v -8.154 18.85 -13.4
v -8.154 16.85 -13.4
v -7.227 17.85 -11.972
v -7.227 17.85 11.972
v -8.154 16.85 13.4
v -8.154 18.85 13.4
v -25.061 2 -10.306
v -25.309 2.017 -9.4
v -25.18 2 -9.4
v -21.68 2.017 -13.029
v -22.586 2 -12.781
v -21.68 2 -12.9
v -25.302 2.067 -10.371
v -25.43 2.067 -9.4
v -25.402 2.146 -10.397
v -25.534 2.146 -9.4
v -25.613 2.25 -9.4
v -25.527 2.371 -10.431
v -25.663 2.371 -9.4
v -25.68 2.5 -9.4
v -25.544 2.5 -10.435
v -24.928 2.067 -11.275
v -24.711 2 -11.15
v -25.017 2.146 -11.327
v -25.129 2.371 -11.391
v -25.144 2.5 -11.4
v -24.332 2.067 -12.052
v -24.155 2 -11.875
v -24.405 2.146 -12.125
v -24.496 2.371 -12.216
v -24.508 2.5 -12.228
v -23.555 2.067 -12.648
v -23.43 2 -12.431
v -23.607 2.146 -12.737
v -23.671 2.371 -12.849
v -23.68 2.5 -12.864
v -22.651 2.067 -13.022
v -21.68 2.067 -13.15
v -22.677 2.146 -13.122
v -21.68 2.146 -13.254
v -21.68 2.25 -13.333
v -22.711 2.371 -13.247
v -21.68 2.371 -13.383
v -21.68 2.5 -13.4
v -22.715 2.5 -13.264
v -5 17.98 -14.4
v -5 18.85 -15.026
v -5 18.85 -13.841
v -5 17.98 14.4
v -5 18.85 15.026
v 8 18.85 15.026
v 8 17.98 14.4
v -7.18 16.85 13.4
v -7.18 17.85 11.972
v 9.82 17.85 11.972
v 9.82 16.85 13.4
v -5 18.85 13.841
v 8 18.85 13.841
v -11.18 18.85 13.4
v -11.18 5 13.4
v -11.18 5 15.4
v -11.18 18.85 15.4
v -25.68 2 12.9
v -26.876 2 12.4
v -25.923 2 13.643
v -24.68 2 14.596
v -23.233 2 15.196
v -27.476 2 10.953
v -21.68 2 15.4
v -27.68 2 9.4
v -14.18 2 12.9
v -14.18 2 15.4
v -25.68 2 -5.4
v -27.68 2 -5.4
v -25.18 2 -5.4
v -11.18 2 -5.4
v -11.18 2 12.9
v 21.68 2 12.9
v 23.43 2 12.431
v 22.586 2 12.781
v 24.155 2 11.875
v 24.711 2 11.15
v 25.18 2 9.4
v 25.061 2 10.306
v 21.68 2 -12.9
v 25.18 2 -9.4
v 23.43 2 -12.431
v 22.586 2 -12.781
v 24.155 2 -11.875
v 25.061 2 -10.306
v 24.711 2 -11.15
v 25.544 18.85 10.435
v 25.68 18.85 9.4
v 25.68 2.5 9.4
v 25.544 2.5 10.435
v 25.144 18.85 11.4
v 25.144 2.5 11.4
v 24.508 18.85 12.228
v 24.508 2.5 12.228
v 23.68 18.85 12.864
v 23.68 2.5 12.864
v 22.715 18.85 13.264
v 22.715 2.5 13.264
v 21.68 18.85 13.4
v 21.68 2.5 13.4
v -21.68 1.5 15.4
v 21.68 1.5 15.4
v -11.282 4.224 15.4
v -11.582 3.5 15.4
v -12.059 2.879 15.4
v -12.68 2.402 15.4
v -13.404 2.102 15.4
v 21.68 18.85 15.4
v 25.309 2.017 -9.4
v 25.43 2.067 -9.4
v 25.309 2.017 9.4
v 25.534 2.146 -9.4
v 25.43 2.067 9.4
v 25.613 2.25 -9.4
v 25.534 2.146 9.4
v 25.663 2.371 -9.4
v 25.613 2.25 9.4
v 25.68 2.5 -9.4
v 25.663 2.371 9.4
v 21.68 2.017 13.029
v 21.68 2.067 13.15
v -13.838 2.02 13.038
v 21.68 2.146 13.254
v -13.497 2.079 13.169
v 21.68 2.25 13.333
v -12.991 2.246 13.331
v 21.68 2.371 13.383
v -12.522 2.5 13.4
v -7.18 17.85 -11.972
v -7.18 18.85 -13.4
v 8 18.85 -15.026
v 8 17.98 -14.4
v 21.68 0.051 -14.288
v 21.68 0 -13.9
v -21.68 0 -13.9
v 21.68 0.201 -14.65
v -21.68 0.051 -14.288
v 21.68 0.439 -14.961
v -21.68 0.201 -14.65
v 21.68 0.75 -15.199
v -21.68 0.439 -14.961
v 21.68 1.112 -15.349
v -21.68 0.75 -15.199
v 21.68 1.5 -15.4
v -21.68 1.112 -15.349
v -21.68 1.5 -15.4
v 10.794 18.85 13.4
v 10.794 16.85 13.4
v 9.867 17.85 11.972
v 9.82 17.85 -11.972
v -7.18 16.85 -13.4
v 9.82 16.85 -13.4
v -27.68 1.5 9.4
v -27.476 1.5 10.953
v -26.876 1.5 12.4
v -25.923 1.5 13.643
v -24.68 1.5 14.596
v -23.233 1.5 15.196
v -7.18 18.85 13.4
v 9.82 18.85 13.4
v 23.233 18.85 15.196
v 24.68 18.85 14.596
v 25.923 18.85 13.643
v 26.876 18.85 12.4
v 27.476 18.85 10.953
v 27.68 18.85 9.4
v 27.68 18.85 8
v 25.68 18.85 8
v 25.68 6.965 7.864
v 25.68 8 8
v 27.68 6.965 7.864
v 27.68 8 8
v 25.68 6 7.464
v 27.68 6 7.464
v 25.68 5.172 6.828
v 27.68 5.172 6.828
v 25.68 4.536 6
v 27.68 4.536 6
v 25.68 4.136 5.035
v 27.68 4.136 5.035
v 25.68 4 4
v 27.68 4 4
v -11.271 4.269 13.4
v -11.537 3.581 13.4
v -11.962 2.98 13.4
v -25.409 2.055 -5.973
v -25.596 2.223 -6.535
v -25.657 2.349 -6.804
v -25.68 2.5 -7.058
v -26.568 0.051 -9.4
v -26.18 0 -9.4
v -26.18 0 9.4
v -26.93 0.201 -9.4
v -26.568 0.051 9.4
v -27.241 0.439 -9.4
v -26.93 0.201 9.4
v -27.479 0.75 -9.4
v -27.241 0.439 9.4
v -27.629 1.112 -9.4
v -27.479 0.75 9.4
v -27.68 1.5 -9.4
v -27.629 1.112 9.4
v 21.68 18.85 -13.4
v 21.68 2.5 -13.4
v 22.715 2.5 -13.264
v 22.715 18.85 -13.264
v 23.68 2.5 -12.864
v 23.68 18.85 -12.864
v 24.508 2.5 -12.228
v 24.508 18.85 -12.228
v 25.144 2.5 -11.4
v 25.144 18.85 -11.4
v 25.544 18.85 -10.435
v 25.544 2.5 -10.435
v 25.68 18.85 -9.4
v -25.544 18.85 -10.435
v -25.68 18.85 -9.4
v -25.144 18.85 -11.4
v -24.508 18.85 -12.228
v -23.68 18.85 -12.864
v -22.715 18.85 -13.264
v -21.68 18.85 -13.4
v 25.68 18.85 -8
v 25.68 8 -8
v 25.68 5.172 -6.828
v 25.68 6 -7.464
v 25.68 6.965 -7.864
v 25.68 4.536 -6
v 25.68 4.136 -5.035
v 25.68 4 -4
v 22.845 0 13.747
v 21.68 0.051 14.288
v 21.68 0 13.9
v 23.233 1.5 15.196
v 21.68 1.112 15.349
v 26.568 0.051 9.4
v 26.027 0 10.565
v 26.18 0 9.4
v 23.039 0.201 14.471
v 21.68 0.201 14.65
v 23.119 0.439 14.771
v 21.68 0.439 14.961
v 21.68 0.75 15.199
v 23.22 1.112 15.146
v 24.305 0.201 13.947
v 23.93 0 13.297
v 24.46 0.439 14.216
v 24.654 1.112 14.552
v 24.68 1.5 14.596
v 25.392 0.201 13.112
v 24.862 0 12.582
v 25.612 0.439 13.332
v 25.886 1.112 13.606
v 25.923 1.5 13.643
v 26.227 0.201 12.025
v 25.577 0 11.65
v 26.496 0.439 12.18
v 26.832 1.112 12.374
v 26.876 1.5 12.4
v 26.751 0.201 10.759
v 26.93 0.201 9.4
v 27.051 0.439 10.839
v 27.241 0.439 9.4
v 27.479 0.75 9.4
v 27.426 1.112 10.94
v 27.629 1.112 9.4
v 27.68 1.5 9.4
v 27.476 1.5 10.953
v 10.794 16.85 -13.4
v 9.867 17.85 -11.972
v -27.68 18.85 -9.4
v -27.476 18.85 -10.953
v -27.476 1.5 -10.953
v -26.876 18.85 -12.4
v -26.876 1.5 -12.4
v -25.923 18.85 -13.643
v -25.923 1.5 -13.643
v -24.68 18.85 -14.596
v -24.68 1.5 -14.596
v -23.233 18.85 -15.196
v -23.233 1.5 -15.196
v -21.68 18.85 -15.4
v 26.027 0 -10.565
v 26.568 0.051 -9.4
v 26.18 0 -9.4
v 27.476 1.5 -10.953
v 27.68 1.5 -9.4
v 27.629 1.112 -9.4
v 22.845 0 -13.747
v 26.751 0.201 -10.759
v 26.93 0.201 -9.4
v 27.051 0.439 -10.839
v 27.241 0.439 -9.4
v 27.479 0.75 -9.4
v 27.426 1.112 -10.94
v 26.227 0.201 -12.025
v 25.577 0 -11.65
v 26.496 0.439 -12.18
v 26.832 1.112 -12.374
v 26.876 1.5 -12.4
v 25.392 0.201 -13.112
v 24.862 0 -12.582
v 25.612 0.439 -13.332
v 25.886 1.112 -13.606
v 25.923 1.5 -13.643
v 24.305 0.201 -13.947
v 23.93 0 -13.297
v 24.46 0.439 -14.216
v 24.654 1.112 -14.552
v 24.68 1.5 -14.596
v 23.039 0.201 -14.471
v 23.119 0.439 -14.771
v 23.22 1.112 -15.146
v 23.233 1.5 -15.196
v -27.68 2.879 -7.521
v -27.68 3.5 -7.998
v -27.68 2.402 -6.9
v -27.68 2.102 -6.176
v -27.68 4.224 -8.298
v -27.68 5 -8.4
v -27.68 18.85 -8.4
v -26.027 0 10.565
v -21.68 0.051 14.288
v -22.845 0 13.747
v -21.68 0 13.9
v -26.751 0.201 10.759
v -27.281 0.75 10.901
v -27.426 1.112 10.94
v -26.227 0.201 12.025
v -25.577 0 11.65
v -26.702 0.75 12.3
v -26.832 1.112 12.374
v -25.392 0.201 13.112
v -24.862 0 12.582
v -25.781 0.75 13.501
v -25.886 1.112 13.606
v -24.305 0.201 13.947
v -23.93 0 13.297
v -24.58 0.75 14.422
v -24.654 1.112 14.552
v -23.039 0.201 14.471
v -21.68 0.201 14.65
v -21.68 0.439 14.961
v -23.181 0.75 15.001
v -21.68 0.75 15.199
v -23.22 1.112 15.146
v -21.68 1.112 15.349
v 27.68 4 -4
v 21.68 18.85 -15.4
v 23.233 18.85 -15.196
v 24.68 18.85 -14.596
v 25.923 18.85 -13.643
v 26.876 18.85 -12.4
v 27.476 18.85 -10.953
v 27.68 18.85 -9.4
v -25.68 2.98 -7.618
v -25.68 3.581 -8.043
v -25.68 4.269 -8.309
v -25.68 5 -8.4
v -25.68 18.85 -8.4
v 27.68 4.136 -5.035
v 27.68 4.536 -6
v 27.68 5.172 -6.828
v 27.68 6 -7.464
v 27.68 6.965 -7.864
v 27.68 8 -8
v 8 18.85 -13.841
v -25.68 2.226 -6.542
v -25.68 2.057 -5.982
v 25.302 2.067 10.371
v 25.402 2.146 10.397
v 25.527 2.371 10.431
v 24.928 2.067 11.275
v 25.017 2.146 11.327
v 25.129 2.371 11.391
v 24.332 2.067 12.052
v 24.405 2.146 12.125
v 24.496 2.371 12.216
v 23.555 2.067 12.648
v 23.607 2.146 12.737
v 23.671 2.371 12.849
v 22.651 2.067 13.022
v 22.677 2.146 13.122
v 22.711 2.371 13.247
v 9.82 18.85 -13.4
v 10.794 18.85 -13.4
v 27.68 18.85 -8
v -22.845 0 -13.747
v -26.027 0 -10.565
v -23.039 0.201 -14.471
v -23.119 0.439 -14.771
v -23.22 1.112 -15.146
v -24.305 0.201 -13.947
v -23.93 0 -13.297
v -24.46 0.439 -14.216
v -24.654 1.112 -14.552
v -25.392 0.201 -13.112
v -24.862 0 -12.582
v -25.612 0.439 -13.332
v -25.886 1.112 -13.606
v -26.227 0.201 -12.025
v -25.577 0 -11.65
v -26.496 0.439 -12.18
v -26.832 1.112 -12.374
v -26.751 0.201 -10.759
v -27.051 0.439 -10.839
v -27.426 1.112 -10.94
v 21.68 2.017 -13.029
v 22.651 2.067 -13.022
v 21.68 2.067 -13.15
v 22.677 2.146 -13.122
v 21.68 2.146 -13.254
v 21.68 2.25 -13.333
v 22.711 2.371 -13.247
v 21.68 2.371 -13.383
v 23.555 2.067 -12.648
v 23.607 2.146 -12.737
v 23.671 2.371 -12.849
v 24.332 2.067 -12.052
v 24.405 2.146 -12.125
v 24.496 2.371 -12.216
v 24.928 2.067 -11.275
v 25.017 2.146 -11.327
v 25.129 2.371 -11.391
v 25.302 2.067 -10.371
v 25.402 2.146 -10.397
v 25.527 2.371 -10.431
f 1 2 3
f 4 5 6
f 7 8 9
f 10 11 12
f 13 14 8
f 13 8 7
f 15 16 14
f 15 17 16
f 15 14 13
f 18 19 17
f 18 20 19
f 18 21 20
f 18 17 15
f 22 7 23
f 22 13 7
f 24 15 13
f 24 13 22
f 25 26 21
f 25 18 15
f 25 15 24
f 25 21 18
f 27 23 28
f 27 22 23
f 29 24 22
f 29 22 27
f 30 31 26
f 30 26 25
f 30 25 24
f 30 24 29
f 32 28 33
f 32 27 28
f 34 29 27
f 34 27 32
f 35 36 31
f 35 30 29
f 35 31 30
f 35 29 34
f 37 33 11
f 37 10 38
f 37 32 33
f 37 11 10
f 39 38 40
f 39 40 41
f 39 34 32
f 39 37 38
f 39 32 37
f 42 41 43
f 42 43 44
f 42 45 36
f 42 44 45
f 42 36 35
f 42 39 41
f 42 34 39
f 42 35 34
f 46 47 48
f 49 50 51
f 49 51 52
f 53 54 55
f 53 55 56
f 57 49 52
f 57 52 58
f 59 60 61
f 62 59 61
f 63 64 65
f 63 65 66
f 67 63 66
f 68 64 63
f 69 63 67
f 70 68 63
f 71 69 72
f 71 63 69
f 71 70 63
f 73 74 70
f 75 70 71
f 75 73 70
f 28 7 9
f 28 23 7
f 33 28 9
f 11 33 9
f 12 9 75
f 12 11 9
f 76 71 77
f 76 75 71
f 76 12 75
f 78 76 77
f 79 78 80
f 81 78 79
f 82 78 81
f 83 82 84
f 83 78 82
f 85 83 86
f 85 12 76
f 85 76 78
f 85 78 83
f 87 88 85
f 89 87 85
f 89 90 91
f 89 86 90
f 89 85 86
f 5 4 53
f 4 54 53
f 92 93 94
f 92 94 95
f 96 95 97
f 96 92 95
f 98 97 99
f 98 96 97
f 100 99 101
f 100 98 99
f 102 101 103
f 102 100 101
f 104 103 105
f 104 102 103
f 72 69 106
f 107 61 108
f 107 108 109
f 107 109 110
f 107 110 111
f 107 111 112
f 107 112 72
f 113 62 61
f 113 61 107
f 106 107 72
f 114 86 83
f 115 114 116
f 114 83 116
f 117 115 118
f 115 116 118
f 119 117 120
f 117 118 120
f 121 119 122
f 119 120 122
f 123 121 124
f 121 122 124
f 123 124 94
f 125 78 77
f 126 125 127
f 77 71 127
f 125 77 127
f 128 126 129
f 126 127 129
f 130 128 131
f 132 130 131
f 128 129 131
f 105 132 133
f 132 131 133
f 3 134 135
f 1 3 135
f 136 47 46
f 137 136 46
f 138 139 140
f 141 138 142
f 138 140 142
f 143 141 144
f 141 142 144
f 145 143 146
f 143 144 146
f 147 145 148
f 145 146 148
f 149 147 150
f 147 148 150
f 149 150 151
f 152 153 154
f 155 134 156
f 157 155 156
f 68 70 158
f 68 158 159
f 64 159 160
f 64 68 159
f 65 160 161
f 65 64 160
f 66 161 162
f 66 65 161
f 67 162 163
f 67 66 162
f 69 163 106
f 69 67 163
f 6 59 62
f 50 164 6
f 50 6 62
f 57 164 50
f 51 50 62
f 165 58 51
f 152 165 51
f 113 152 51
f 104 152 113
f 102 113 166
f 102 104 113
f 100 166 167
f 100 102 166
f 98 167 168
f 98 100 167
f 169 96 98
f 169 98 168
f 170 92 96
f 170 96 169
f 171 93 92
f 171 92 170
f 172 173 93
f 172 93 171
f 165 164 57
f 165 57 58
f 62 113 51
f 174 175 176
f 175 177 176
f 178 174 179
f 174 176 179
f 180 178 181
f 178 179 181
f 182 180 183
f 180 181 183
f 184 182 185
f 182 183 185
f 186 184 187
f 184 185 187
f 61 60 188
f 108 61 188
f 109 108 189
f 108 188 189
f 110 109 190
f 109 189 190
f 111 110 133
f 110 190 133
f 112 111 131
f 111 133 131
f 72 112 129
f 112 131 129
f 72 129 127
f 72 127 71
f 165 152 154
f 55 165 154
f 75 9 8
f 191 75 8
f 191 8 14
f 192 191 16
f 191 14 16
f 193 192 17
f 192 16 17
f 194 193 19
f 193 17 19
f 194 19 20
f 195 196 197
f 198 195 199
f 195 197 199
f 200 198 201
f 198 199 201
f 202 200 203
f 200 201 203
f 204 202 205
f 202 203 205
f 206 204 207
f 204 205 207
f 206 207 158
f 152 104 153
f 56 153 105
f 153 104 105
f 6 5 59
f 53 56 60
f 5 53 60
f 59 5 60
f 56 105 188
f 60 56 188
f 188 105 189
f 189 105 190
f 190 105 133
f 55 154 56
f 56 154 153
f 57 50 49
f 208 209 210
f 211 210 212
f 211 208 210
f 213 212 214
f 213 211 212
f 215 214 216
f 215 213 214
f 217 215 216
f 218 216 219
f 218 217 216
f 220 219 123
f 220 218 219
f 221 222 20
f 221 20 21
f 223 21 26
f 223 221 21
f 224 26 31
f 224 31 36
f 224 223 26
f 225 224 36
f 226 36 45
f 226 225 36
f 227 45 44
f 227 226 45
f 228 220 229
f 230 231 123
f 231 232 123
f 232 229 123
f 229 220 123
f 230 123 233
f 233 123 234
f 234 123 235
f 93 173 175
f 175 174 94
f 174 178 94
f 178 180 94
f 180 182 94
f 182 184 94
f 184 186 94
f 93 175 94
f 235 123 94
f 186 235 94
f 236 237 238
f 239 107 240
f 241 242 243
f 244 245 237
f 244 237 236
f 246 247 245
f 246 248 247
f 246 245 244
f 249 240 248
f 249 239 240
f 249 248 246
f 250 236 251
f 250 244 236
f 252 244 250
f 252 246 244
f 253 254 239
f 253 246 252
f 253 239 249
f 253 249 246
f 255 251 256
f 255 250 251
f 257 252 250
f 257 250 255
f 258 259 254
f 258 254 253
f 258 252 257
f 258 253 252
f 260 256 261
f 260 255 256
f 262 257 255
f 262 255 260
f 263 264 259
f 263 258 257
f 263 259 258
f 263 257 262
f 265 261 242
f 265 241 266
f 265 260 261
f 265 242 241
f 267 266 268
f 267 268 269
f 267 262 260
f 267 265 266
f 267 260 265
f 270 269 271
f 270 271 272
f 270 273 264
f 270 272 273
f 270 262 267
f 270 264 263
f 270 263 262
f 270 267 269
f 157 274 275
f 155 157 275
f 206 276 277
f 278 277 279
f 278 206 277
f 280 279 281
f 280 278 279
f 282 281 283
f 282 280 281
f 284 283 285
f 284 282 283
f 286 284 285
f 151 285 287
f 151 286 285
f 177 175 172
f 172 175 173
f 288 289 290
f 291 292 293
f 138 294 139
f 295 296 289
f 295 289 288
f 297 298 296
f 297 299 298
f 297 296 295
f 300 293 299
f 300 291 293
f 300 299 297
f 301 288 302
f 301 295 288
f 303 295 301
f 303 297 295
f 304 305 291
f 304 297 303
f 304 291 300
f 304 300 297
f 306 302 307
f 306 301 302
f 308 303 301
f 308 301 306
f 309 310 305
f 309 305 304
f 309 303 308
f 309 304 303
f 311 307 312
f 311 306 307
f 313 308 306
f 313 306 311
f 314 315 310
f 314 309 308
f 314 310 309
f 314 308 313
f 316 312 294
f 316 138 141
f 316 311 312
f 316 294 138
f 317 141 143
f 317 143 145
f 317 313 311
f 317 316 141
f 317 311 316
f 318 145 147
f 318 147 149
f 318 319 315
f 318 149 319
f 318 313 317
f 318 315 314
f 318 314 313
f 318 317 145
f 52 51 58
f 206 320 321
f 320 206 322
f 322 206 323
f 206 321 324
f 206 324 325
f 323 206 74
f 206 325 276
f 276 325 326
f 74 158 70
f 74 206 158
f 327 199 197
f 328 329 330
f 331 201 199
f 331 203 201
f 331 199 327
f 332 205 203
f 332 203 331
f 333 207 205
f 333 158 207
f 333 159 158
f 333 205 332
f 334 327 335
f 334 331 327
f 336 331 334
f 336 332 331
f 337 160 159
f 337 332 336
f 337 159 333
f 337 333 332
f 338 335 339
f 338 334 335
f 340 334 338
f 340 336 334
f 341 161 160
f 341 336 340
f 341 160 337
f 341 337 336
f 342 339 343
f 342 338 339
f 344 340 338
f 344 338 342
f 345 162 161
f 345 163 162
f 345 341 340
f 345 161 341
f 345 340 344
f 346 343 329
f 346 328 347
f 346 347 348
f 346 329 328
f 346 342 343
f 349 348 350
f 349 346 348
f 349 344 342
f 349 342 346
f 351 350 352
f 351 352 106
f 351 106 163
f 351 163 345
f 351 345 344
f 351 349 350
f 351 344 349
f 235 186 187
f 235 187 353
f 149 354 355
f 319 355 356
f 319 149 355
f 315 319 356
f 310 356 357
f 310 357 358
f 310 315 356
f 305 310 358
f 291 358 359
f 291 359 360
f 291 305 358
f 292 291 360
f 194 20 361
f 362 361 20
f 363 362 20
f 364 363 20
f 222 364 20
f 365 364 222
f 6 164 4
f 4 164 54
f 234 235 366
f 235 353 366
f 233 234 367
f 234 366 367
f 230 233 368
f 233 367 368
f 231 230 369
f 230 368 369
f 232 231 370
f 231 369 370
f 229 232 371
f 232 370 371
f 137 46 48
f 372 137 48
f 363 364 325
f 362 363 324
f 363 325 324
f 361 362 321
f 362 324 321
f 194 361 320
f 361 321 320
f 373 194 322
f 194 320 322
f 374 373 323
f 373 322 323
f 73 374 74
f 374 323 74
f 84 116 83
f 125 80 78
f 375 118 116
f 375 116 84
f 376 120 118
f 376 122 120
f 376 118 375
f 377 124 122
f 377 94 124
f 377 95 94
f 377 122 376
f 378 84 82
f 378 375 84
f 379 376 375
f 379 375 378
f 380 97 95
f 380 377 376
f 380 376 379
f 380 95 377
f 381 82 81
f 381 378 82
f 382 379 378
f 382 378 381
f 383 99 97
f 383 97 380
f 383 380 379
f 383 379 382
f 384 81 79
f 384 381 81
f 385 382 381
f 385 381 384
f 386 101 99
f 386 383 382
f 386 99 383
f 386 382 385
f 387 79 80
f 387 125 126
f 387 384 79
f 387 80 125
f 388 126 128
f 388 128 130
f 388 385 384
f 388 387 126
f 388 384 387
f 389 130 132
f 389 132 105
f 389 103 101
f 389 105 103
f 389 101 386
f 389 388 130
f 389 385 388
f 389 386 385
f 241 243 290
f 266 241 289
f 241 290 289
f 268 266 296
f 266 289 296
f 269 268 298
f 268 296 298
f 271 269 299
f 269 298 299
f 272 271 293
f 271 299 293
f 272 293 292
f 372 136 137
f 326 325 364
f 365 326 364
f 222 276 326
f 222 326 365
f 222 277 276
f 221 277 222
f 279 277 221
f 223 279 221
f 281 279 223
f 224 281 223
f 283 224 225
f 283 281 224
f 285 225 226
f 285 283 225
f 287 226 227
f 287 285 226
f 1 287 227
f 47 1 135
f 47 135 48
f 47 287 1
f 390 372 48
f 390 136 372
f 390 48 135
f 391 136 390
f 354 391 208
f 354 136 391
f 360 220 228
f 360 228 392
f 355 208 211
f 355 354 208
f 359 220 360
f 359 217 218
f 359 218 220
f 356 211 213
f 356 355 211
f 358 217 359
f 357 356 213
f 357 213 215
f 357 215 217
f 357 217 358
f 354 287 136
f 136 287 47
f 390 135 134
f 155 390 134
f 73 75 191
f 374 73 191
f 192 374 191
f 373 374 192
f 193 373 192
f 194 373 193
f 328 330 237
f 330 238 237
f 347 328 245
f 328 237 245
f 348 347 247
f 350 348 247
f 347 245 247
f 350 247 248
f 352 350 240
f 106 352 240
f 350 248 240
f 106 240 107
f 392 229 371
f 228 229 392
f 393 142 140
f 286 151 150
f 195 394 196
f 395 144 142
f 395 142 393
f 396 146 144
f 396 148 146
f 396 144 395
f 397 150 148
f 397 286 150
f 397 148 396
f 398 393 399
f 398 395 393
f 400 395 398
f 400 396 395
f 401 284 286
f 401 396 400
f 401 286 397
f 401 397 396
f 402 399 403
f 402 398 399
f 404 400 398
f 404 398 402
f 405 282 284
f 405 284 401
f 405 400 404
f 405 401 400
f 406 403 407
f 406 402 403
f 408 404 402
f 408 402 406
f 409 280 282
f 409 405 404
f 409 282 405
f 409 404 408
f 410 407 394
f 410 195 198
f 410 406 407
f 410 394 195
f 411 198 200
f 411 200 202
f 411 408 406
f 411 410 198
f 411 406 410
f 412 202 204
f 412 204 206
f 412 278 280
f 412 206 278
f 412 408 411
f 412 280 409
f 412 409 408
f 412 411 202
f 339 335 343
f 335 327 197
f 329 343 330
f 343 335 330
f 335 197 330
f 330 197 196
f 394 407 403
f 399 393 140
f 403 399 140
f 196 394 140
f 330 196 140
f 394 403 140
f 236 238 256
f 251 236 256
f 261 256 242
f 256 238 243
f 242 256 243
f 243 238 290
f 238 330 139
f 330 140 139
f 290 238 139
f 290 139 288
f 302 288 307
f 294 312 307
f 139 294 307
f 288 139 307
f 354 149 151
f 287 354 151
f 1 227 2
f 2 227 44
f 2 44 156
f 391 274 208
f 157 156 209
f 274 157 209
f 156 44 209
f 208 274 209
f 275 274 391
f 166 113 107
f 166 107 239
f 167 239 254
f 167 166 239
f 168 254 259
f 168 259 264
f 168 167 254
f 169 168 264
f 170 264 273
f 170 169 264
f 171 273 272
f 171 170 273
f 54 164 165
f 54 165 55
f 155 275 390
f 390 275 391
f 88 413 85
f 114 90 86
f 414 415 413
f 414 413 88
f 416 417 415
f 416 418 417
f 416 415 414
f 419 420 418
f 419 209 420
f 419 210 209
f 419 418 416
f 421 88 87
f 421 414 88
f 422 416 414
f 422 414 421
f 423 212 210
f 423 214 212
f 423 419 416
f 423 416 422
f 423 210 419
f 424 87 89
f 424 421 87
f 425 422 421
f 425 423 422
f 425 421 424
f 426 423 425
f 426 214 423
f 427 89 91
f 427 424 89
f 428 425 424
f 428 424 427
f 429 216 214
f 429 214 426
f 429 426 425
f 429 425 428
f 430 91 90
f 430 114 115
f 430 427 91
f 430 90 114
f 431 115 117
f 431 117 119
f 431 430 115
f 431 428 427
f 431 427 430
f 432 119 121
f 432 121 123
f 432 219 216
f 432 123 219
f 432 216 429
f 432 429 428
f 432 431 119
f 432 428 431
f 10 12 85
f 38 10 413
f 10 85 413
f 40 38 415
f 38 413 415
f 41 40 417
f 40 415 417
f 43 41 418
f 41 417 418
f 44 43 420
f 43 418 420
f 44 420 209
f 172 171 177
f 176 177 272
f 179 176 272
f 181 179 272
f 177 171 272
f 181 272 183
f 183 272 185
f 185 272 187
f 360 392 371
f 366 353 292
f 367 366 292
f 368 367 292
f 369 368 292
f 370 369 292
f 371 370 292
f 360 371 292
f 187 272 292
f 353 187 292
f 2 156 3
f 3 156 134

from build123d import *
from OCP.BRepFilletAPI import BRepFilletAPI_MakeFillet

# Parameters (mm, degrees)
SKETCH1_W               = 55.36
SKETCH1_H               = 30.8
BOSS_EXTRUDE1_DEPTH     = 2
SKETCH3_W               = 2
SKETCH3_H               = 5
BOSS_EXTRUDE3_DEPTH     = 16.85
SKETCH5_W               = 16
SKETCH5_H               = 20
CUT_EXTRUDE1_DEPTH      = 37.860071894
FILLET1_R1              = 6
FILLET1_R2              = 4
FILLET2_R               = 1.5
BOSS_EXTRUDE4_START     = -3
BOSS_EXTRUDE4_DEPTH     = 17
CHAMFER1_SIZE           = 0.97411139
CHAMFER1_SIZE_2         = 1.5
FILLET6_R               = 0.5
FILLET7_R               = 4
CUT_EXTRUDE2_DEPTH      = 8
CUT_EXTRUDE2_DEPTH_BACK = 5
FILLET8_START           = -27.68
FILLET8_DEPTH           = 2
FILLET8_START_2         = 12.8999999
FILLET8_2_DEPTH         = 2.5000001
FILLET8_START_3         = -8.4
FILLET8_3_DEPTH         = 3.0000001
FILLET8_START_4         = -25.68
FILLET8_4_DEPTH         = 14.5


with BuildPart() as part:
    # Sketch1 → Boss-Extrude1 (new body)
    with BuildSketch(Plane(origin=(0, 0, 0), x_dir=(1, 0, 0), z_dir=(0, 1, 0))):
        Rectangle(SKETCH1_W, SKETCH1_H)
    extrude(amount=BOSS_EXTRUDE1_DEPTH)

    # Sketch3 → Boss-Extrude3 (add)
    with BuildSketch(Plane(origin=(0, 2, 0), x_dir=(1, 0, 0), z_dir=(0, 1, 0))):
        with Locations((-26.68, 10.9)):
            Rectangle(SKETCH3_W, SKETCH3_H)
        Polygon((-27.68, 15.4), (-27.68, 13.4), (-25.68, 13.4), (25.68, 13.4), (25.68, -13.4), (-11.18, -13.4), (-11.18, -15.4), (27.68, -15.4), (27.68, 15.4), align=None)
    extrude(amount=BOSS_EXTRUDE3_DEPTH)

    # Sketch5 → Cut-Extrude1 (cut, through all)
    with BuildSketch(Plane(origin=(0, 0, 0), x_dir=(0, 0, -1), z_dir=(1, 0, 0))):
        with Locations((0, 14)):
            Rectangle(SKETCH5_W, SKETCH5_H)
    extrude(amount=CUT_EXTRUDE1_DEPTH, mode=Mode.SUBTRACT)

    # Fillet1: one fillet with a radius per group of edges: ONE call of the kernel's fillet builder (fillet() takes one radius for all edges)
    fillet1_edges_1 = [part.edges().sort_by_distance(p)[0] for p in [
        (27.68, 9.425, -15.4),
        (27.68, 9.425, 15.4),
        (-27.68, 9.425, -15.4),
        (-27.68, 1, 15.4),
    ]]
    fillet1_edges_2 = [part.edges().sort_by_distance(p)[0] for p in [
        (25.68, 10.425, -13.4),
        (25.68, 10.425, 13.4),
        (-25.68, 10.425, -13.4),
    ]]
    fillet1 = BRepFilletAPI_MakeFillet(part.part.solid().wrapped)
    for e in fillet1_edges_1:
        fillet1.Add(FILLET1_R1, e.wrapped)
    for e in fillet1_edges_2:
        fillet1.Add(FILLET1_R2, e.wrapped)
    add(Compound.cast(fillet1.Shape()), mode=Mode.REPLACE)

    # Fillet2
    fillet2_edges = [part.edges().sort_by_distance(p)[0] for p in [
        (0, 0, 15.4),
        (27.68, 0, 0),
        (-27.68, 0, 0),
        (0, 0, -15.4),
        (25.922640687, 0, -13.642640687),
        (25.922640687, 0, 13.642640687),
        (-25.922640687, 0, -13.642640687),
        (-25.922640687, 0, 13.642640687),
    ]]
    fillet(fillet2_edges, radius=FILLET2_R)

    # Sketch4 → Boss-Extrude4 (add)
    with BuildSketch(Plane.ZY.offset(10.18).offset(BOSS_EXTRUDE4_START)):
        Polygon((-13.4, 18.85), (-11.971851993, 17.85), (-13.4, 16.85), align=None)
        Polygon((13.4, 18.85), (11.971851993, 17.85), (13.4, 16.85), align=None)
    extrude(amount=-BOSS_EXTRUDE4_DEPTH)

    # Chamfer1
    # the kernel refuses this chamfer: 1.5, 0.97411139 mm, written as the material it adds along each edge
    with BuildSketch(Plane(origin=(9.82, 12.9733385, 13.4), x_dir=(1, 0, 0), z_dir=(0, 1, 0))) as chamfer1_piece_1_section:
        Polygon((CHAMFER1_SIZE, 0), (0, CHAMFER1_SIZE_2), (0, 0), align=None)
    chamfer1_piece_1 = extrude(amount=5.8766615, mode=Mode.PRIVATE)
    chamfer1_piece_1 = split(chamfer1_piece_1, bisect_by=Plane(origin=(9.82, 15.574617411, 15.221435103), z_dir=(0, 0.8191520442889897, 0.5735764363510492)), keep=Keep.TOP, mode=Mode.PRIVATE)
    chamfer1_piece_1 = split(chamfer1_piece_1, bisect_by=Plane(origin=(9.82, 16.916637554, 10.638872277), z_dir=(0, -0.8191520442889973, 0.5735764363510382)), keep=Keep.TOP, mode=Mode.PRIVATE)
    add(chamfer1_piece_1)
    with BuildSketch(Plane(origin=(-7.18, 12.9733385, 13.4), x_dir=(-1, 0, 0), z_dir=(0, 1, 0))) as chamfer1_piece_2_section:
        Polygon((CHAMFER1_SIZE, 0), (0, -CHAMFER1_SIZE_2), (0, 0), align=None)
    chamfer1_piece_2 = extrude(amount=5.8766615, mode=Mode.PRIVATE)
    chamfer1_piece_2 = split(chamfer1_piece_2, bisect_by=Plane(origin=(-7.18, 15.574617411, 15.221435103), z_dir=(0, 0.8191520442889897, 0.5735764363510492)), keep=Keep.TOP, mode=Mode.PRIVATE)
    chamfer1_piece_2 = split(chamfer1_piece_2, bisect_by=Plane(origin=(-7.18, 16.916637554, 10.638872277), z_dir=(0, -0.8191520442889973, 0.5735764363510382)), keep=Keep.TOP, mode=Mode.PRIVATE)
    add(chamfer1_piece_2)
    with BuildSketch(Plane(origin=(9.82, 12.9733385, -13.4), x_dir=(1, 0, 0), z_dir=(0, 1, 0))) as chamfer1_piece_3_section:
        Polygon((CHAMFER1_SIZE, 0), (0, -CHAMFER1_SIZE_2), (0, 0), align=None)
    chamfer1_piece_3 = extrude(amount=5.8766615, mode=Mode.PRIVATE)
    chamfer1_piece_3 = split(chamfer1_piece_3, bisect_by=Plane(origin=(9.82, 15.574617411, -15.221435103), z_dir=(0, 0.8191520442889897, -0.5735764363510492)), keep=Keep.TOP, mode=Mode.PRIVATE)
    chamfer1_piece_3 = split(chamfer1_piece_3, bisect_by=Plane(origin=(9.82, 16.916637554, -10.638872277), z_dir=(0, -0.8191520442889973, -0.5735764363510382)), keep=Keep.TOP, mode=Mode.PRIVATE)
    add(chamfer1_piece_3)
    with BuildSketch(Plane(origin=(-7.18, 12.9733385, -13.4), x_dir=(-1, 0, 0), z_dir=(0, 1, 0))) as chamfer1_piece_4_section:
        Polygon((CHAMFER1_SIZE, 0), (0, CHAMFER1_SIZE_2), (0, 0), align=None)
    chamfer1_piece_4 = extrude(amount=5.8766615, mode=Mode.PRIVATE)
    chamfer1_piece_4 = split(chamfer1_piece_4, bisect_by=Plane(origin=(-7.18, 15.574617411, -15.221435103), z_dir=(0, 0.8191520442889897, -0.5735764363510492)), keep=Keep.TOP, mode=Mode.PRIVATE)
    chamfer1_piece_4 = split(chamfer1_piece_4, bisect_by=Plane(origin=(-7.18, 16.916637554, -10.638872277), z_dir=(0, -0.8191520442889973, -0.5735764363510382)), keep=Keep.TOP, mode=Mode.PRIVATE)
    add(chamfer1_piece_4)

    # Fillet6
    fillet6_edges = [part.edges().sort_by_distance(p)[0] for p in [
        (-25.68, 2, -8.9),
        (5.25, 2, 13.4),
        (0, 2, -13.4),
        (25.68, 2, 0),
        (24.508427125, 2, -12.228427125),
        (24.508427125, 2, 12.228427125),
        (-24.508427125, 2, -12.228427125),
    ]]
    fillet(fillet6_edges, radius=FILLET6_R)

    # Fillet7
    fillet7_edges = [part.edges().sort_by_distance(p)[0] for p in [
        (26.68, 4, -8),
        (26.68, 4, 8),
    ]]
    fillet(fillet7_edges, radius=FILLET7_R)

    # Sketch6 → Cut-Extrude2 (cut, two sides: drawn at the far end of the back side and taken through both)
    with BuildSketch(Plane(origin=(0, 0, 0), x_dir=(0, 0, -1), z_dir=(1, 0, 0)).offset(-CUT_EXTRUDE2_DEPTH_BACK)):
        Polygon((-15.025755833, 18.85), (-14.4, 17.97951196), (-13.841478047, 18.85), align=None)
        Polygon((13.841478047, 18.85), (15.025755833, 18.85), (14.4, 17.97951196), align=None)
    extrude(amount=CUT_EXTRUDE2_DEPTH + CUT_EXTRUDE2_DEPTH_BACK, mode=Mode.SUBTRACT)

    # Fillet8: read off the stored shape, not the designer's step
    # Fillet8 outline → Fillet8 (add)
    with BuildSketch(Plane.YZ.offset(FILLET8_START)):
        with BuildLine():
            Line((2, -8.4), (5, -8.4))
            ThreePointArc((5, -8.4), (2.878679656, -7.521320344), (2, -5.4))
            Line((2, -5.4), (2, -8.4))
        make_face()
    extrude(amount=FILLET8_DEPTH)

    # Fillet8 2 outline → Fillet8 2 (add)
    with BuildSketch(Plane.XY.offset(FILLET8_START_2)):
        with BuildLine():
            ThreePointArc((-11.18, 5), (-12.058679656, 2.878679656), (-14.18, 2))
            Line((-14.18, 2), (-11.18, 2))
            Line((-11.18, 2), (-11.18, 5))
        make_face()
    extrude(amount=FILLET8_2_DEPTH)

    # Fillet8 3 outline → Fillet8 3 (add)
    with BuildSketch(Plane.XY.offset(FILLET8_START_3)):
        with BuildLine():
            ThreePointArc((-25.18, 2), (-25.533553391, 2.146446609), (-25.68, 2.5))
            Line((-25.68, 2.5), (-25.68, 2))
            Line((-25.68, 2), (-25.18, 2))
        make_face()
    extrude(amount=FILLET8_3_DEPTH)

    # Fillet8 4 outline → Fillet8 4 (cut)
    with BuildSketch(Plane.YZ.offset(FILLET8_START_4)):
        with BuildLine():
            ThreePointArc((2.5, 13.4), (2.146446609, 13.253553391), (2, 12.9))
            Line((2, 12.9), (5, 12.8999999))
            Line((5, 12.8999999), (5, 13.4))
            Line((5, 13.4), (2.5, 13.4))
        make_face()
        with BuildLine():
            ThreePointArc((2, -5.4), (2.127718677, -6.266025404), (2.5, -7.058312396))
            Line((2.5, -7.058312396), (2.5, -5.3999999))
            Line((2.5, -5.3999999), (2, -5.4))
        make_face()
    extrude(amount=FILLET8_4_DEPTH, mode=Mode.SUBTRACT)


solid = part.part
